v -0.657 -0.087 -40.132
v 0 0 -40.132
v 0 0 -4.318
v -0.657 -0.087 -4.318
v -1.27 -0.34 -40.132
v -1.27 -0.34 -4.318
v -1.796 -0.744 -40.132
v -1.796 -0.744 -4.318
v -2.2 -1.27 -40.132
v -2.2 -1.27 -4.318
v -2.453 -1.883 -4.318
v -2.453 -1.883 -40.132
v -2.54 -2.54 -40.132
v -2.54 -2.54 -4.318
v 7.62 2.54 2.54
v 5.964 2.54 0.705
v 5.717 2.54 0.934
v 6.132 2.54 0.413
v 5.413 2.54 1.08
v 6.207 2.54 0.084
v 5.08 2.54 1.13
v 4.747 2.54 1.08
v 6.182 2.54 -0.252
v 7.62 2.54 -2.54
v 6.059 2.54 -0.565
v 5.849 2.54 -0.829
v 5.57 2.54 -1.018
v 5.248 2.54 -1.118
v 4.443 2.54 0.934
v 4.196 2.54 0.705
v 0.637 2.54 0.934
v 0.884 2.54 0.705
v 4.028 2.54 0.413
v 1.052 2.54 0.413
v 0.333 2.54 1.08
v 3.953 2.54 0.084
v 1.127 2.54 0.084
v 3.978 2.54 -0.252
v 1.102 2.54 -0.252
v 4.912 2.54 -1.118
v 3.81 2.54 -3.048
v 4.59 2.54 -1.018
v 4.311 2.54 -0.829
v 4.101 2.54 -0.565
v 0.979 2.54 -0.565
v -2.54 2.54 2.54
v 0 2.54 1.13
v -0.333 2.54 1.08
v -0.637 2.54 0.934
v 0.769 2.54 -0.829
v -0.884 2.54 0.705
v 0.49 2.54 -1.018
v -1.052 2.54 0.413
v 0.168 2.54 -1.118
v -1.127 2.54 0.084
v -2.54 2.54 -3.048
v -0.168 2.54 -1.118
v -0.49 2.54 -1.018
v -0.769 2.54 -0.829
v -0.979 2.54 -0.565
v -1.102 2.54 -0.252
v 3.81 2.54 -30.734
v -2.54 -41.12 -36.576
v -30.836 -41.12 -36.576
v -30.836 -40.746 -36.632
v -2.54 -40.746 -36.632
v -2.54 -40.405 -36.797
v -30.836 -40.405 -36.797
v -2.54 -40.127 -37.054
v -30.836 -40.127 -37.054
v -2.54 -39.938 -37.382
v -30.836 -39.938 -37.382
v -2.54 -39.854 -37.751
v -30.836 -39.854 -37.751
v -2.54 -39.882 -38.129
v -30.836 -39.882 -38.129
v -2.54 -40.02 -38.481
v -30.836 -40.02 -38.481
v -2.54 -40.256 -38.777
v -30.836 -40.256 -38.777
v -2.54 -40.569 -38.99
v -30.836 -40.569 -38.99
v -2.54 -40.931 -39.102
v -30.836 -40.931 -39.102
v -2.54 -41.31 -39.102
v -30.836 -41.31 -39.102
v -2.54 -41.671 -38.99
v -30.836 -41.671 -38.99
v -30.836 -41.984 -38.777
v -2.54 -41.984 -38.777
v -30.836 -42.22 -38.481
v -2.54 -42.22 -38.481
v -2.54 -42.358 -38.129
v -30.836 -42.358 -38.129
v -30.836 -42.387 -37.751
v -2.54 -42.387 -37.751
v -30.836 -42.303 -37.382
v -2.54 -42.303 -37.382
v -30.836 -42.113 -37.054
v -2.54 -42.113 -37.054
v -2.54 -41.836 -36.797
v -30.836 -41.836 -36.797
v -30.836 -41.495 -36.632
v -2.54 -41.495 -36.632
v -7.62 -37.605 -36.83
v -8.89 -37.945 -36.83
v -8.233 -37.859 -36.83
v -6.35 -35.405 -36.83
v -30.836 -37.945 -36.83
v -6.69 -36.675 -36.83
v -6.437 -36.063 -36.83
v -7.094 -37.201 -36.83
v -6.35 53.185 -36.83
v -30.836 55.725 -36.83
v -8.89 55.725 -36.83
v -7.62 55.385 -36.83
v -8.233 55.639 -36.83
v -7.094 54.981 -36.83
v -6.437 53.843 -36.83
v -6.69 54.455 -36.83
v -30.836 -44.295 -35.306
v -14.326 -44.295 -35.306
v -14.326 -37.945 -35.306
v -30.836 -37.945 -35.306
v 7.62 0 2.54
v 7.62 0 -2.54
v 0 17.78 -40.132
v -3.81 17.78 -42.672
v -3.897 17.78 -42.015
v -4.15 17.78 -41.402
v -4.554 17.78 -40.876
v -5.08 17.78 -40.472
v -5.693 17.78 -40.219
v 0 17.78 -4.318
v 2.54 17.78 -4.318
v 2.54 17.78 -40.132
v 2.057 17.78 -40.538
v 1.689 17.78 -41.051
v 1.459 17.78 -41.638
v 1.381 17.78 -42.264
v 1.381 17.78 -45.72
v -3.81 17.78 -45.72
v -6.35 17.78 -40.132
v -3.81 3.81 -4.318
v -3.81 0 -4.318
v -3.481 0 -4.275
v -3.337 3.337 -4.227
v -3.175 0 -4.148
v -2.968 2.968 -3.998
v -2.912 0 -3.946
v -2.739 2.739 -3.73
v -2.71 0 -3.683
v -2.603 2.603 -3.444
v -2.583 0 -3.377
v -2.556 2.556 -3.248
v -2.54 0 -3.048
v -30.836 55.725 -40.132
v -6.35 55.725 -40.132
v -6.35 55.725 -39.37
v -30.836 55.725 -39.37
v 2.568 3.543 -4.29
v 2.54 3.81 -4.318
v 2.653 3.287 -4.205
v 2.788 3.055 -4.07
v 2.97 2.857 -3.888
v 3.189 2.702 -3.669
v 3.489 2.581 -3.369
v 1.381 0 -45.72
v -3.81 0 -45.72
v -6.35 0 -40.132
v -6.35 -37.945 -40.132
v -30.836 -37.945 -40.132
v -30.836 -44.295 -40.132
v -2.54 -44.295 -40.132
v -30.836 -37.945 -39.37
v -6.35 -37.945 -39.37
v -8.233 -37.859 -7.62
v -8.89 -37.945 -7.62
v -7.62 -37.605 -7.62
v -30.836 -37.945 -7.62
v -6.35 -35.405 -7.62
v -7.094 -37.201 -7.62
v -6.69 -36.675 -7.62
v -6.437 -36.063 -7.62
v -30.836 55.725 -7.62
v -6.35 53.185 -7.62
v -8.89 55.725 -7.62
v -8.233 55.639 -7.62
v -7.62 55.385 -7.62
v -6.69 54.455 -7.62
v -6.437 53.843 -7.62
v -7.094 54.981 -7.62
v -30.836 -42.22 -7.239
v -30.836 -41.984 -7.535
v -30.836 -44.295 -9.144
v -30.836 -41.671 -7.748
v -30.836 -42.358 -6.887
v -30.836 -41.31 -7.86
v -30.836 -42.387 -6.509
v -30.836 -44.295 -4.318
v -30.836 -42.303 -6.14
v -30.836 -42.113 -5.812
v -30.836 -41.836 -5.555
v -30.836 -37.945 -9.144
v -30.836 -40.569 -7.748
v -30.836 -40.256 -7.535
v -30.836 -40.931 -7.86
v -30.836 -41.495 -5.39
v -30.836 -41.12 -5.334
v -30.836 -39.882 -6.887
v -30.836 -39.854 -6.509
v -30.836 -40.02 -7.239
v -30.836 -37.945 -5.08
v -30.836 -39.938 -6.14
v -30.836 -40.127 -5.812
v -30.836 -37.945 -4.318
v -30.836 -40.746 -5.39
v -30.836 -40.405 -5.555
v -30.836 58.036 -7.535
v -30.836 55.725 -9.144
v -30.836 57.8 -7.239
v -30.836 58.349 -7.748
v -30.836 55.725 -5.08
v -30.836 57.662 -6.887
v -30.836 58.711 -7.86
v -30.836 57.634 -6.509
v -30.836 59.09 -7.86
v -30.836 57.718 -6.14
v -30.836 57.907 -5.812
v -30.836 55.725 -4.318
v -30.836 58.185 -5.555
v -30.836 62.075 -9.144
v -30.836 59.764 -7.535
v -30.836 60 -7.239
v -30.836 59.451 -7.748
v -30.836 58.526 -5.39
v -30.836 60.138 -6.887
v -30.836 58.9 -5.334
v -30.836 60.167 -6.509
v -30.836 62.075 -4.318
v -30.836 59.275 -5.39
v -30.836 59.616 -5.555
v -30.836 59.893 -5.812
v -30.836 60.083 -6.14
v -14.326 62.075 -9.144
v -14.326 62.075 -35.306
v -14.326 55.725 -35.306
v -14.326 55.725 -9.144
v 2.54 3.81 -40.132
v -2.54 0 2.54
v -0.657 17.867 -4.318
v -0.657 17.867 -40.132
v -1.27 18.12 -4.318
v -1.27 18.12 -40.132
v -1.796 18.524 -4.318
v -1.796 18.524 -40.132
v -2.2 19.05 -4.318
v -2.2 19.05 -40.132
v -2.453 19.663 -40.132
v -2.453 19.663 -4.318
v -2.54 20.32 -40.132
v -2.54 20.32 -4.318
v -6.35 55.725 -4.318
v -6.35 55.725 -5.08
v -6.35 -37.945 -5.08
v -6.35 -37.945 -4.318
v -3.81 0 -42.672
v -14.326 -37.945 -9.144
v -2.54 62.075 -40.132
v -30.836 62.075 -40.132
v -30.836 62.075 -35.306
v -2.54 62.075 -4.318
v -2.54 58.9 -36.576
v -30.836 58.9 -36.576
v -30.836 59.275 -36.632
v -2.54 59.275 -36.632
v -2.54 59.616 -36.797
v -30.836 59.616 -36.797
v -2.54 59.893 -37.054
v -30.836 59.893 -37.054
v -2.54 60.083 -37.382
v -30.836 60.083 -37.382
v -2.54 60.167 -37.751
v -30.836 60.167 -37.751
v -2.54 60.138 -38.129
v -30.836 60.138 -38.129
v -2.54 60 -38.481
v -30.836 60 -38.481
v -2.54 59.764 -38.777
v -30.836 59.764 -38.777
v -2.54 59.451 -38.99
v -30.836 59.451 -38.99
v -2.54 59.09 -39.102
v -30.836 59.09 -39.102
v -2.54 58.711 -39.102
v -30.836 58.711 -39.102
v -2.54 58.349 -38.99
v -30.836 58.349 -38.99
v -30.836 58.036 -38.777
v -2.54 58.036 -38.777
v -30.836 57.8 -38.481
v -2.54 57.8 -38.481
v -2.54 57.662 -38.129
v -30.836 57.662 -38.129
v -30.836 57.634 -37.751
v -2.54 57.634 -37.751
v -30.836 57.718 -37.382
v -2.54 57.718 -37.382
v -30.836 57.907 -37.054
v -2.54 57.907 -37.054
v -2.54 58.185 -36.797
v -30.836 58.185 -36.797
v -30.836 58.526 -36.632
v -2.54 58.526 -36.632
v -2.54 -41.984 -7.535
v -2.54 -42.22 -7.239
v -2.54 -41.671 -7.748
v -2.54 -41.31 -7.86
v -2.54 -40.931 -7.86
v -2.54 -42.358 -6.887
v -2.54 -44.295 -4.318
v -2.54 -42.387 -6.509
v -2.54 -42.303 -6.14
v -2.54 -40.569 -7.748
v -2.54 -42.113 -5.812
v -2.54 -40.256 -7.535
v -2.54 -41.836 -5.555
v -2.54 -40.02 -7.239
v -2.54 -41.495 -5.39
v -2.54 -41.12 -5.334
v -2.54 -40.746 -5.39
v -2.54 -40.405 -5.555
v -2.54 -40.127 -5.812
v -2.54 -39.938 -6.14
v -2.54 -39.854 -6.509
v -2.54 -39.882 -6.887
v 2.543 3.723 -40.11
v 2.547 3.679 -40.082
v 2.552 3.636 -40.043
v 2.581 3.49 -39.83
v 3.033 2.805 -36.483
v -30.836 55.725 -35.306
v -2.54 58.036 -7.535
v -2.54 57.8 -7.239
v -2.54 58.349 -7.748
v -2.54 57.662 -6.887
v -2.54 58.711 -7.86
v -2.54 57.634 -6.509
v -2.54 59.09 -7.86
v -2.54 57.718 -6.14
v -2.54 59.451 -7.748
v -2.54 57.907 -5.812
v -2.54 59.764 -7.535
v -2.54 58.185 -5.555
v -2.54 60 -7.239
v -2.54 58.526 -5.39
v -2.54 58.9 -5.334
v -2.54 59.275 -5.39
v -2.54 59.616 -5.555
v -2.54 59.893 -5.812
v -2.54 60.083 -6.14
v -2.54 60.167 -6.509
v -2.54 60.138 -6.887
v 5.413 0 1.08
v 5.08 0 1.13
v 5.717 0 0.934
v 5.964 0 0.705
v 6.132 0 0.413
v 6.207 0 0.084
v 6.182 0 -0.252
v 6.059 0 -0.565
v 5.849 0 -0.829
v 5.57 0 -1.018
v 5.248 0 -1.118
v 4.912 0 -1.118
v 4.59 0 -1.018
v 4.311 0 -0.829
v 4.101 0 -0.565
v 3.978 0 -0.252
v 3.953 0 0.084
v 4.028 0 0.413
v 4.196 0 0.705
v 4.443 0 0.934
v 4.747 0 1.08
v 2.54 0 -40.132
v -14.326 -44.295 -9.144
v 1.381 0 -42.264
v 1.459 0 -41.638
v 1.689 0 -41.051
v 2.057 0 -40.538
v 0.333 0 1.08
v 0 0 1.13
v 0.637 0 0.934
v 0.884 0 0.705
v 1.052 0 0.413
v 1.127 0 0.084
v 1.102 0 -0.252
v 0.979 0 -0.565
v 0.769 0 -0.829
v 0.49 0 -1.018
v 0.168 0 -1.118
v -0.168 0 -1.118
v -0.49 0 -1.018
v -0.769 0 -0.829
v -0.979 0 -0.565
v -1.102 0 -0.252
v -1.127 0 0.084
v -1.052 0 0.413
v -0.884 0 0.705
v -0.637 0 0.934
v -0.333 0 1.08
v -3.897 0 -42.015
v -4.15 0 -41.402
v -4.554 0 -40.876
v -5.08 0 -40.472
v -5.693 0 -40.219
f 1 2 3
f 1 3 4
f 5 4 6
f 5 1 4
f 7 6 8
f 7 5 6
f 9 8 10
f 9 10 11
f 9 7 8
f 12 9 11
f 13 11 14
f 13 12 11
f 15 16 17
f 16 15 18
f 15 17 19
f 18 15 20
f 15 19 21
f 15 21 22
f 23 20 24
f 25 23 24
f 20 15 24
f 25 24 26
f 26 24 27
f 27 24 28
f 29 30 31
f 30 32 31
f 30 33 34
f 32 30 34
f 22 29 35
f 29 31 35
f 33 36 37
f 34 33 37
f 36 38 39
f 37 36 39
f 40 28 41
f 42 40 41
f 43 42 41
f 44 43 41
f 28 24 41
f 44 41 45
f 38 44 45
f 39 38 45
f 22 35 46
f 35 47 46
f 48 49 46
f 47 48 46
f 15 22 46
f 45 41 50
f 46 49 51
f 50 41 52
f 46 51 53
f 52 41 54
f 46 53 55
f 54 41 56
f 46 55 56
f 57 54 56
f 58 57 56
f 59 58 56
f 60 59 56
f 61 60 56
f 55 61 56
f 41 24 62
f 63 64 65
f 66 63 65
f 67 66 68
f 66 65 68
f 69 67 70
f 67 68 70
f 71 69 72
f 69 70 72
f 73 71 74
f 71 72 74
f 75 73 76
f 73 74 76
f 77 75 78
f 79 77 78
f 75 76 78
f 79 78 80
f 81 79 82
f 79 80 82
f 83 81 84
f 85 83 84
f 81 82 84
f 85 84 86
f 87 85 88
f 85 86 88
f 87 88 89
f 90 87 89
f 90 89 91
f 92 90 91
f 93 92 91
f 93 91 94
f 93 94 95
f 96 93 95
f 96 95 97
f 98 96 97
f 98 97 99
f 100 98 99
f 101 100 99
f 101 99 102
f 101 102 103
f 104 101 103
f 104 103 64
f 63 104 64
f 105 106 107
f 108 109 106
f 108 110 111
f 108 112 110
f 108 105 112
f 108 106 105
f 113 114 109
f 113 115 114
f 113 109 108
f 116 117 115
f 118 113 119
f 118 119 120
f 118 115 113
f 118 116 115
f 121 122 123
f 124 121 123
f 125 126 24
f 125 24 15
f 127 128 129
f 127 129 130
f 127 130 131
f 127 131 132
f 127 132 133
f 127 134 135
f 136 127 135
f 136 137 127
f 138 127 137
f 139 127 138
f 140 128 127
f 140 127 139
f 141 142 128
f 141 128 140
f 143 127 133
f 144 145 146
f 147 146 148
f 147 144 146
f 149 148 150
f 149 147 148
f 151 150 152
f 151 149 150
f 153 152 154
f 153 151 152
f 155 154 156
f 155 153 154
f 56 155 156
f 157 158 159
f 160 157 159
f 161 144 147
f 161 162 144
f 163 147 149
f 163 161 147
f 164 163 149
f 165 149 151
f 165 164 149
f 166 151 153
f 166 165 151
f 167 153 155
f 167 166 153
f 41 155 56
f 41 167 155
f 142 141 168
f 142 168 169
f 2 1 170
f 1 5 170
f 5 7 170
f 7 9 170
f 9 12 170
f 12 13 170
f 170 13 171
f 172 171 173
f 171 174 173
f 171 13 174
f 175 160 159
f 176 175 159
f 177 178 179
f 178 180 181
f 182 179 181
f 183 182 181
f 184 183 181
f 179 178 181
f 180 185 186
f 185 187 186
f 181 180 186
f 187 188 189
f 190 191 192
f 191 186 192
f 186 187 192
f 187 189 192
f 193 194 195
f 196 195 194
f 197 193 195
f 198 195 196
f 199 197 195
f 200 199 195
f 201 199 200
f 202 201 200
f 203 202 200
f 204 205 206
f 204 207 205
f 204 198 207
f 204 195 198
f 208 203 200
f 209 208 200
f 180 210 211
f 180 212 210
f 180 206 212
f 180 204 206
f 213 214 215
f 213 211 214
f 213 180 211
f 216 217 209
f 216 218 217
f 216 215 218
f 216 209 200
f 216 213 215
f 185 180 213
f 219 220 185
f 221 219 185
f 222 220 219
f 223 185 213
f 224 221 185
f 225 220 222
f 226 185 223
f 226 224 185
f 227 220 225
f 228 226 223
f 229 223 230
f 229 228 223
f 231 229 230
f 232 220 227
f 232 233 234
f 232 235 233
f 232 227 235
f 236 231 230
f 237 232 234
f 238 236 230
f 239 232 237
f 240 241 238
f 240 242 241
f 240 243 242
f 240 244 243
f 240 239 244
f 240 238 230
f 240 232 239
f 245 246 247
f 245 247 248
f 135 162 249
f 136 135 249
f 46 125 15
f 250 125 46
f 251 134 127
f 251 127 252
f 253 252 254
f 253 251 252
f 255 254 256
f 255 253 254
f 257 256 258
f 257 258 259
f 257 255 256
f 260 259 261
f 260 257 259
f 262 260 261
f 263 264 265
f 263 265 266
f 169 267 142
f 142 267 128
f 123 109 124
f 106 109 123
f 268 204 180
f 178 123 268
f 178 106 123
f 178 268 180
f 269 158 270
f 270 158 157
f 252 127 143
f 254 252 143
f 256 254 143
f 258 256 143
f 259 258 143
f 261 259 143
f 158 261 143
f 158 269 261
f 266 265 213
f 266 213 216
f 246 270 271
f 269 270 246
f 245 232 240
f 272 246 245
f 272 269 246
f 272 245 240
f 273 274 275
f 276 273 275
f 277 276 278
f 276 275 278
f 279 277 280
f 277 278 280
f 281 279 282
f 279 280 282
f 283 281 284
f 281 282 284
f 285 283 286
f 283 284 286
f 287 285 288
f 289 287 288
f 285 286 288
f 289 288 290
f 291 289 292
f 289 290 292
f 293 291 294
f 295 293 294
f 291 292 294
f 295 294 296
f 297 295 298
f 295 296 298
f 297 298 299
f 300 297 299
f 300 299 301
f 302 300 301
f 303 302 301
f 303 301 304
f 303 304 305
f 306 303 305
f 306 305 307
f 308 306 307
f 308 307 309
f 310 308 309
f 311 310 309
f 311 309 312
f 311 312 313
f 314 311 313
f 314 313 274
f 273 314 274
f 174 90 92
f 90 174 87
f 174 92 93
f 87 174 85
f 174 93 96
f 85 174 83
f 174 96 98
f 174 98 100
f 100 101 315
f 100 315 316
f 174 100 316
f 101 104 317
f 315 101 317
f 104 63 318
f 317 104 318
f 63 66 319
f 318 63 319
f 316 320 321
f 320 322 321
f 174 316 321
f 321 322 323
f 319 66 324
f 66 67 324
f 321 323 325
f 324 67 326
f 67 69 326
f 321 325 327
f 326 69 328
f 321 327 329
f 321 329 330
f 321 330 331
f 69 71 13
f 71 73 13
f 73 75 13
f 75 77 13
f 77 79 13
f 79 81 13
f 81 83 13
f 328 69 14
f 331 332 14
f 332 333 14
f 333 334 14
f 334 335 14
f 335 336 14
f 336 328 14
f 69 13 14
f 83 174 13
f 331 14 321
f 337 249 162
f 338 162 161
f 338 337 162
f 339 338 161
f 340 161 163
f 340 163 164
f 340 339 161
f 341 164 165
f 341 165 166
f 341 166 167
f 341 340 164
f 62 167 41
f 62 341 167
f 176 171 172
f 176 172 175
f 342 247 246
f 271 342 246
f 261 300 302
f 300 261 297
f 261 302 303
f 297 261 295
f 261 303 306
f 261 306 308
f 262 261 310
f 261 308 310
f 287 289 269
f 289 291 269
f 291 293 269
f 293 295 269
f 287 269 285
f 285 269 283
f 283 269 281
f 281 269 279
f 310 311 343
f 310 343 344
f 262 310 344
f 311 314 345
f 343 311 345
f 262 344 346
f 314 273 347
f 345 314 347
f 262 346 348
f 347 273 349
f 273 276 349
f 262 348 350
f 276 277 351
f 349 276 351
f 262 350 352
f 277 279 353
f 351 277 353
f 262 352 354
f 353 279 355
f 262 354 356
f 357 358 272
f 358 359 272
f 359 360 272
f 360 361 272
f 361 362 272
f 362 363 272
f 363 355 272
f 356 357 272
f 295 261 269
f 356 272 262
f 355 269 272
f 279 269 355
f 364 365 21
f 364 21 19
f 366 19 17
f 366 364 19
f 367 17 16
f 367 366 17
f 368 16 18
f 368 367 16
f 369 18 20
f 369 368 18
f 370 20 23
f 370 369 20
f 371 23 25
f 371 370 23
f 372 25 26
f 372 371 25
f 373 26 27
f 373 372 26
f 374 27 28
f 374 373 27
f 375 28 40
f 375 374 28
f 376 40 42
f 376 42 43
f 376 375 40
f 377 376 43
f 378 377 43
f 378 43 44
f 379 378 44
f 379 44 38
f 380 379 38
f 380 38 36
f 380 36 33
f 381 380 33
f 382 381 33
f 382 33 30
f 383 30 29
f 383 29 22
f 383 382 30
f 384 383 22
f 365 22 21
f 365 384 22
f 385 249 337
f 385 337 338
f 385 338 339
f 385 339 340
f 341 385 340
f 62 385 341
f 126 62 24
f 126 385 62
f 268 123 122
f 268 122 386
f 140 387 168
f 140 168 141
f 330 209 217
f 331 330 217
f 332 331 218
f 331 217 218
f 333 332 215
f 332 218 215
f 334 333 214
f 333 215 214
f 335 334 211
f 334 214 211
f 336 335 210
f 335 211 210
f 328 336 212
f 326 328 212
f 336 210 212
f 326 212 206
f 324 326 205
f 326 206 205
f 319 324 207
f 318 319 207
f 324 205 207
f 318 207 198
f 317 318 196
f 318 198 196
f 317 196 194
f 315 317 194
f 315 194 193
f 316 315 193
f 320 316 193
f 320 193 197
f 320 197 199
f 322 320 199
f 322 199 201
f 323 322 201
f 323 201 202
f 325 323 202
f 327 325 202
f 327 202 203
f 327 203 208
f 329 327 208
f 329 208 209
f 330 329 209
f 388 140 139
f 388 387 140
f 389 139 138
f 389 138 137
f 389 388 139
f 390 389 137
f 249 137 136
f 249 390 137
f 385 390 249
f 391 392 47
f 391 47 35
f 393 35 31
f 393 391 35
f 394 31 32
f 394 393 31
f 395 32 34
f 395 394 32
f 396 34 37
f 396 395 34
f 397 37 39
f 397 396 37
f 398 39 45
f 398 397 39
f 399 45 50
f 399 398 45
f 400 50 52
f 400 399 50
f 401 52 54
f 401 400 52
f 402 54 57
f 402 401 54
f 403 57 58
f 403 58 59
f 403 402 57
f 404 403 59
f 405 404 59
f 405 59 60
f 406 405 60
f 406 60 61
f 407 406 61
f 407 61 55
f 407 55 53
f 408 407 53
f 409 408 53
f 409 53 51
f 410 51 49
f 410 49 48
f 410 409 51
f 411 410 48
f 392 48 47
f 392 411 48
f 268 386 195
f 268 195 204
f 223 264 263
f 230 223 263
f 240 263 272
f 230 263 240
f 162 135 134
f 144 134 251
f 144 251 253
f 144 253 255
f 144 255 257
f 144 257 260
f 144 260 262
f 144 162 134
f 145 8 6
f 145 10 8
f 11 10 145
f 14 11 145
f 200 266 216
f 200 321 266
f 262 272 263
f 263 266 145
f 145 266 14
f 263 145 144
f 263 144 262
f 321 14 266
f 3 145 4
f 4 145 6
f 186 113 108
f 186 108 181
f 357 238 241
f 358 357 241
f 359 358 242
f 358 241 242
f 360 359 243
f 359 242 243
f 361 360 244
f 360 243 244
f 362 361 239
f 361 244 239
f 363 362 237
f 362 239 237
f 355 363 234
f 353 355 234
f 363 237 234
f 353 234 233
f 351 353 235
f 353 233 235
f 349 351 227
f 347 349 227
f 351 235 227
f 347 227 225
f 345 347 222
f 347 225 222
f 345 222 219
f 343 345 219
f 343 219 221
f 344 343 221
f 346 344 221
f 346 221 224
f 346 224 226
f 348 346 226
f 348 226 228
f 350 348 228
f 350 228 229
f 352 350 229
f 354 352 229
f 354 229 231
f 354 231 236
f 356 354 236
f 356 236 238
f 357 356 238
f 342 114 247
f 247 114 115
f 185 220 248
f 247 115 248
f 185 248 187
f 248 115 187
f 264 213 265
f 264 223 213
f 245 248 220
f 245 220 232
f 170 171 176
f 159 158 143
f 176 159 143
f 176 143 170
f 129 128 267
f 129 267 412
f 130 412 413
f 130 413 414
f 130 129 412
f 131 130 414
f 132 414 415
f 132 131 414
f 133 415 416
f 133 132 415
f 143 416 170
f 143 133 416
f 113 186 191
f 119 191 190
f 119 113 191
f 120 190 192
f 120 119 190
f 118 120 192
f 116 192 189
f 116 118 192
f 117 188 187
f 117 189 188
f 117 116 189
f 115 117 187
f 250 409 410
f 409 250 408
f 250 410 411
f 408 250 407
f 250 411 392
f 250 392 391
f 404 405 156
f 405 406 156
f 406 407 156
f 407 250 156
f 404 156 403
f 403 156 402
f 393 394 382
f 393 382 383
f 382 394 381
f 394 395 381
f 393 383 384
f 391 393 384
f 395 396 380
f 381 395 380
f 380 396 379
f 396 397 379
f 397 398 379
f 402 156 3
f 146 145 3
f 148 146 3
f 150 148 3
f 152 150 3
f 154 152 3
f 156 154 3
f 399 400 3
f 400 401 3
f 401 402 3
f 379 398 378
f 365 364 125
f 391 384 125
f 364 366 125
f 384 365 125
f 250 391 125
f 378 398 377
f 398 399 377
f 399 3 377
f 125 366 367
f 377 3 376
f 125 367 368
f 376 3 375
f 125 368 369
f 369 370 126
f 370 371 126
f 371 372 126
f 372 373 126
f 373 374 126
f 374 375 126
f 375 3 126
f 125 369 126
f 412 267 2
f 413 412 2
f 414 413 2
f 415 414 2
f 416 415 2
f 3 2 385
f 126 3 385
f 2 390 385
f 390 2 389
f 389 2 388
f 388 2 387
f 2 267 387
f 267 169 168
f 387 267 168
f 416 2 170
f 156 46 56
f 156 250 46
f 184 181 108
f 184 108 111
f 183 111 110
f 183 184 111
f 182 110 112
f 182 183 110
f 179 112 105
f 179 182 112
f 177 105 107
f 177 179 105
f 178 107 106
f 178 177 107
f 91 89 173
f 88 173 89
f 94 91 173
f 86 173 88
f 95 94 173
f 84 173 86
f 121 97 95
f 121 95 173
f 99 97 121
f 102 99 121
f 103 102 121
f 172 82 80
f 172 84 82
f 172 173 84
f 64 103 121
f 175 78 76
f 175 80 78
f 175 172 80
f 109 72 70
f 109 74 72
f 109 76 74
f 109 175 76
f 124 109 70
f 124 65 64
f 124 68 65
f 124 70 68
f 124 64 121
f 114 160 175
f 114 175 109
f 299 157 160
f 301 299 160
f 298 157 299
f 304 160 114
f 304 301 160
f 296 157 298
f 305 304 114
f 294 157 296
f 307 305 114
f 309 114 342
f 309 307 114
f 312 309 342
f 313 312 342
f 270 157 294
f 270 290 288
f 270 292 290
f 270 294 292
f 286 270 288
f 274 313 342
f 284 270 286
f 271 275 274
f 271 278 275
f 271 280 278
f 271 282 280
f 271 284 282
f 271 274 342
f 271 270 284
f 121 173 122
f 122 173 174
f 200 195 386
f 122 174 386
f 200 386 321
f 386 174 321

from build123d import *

# Parameters (mm, degrees)
SKETCH1_R           = 1.1303
BOSS_EXTRUDE1_DEPTH = 2.54
SKETCH2_W           = 5.08
SKETCH2_H           = 35.814
BOSS_EXTRUDE2_DEPTH = 15.24
SKETCH3_W           = 35.814
SKETCH3_H           = 106.370628
BOSS_EXTRUDE3_DEPTH = 3.81
FILLET1_R           = 1.27
SKETCH4_W           = 5.191
SKETCH4_H           = 17.78
BOSS_EXTRUDE4_DEPTH = 5.588
SKETCH5_W           = 35.814
SKETCH5_H           = 6.35
BOSS_EXTRUDE5_DEPTH = 7.9756
SKETCH6_W           = 4.826
SKETCH6_H           = 6.35
BOSS_EXTRUDE6_DEPTH = 16.51
BOSS_EXTRUDE8_START = -0.762
SKETCH7_W           = 24.4856
SKETCH7_H           = 93.670628
BOSS_EXTRUDE8_DEPTH = 2.54
FILLET2_R           = 2.54
SKETCH8_R           = 1.27
CUT_EXTRUDE1_DEPTH  = 87.153909833


with BuildPart() as part:
    # Sketch1 → Boss-Extrude1 (new body)
    with BuildSketch(Plane(origin=(0, 0, 0), x_dir=(1, 0, 0), z_dir=(0, 1, 0))):
        Polygon((-2.54, 2.54), (-2.54, 40.132), (2.54, 40.132), (7.62, 2.54), (7.62, -2.54), (-2.54, -2.54), align=None)
        with Locations(Location((0, 0, 0), (0, 0, 270))):
            Circle(SKETCH1_R, mode=Mode.SUBTRACT)
        with Locations(Location((5.08, 0, 0), (0, 0, 270))):
            Circle(SKETCH1_R, mode=Mode.SUBTRACT)
    extrude(amount=BOSS_EXTRUDE1_DEPTH)

    # Sketch2 → Boss-Extrude2 (add)
    with BuildSketch(Plane(origin=(0, 2.54, 0), x_dir=(1, 0, 0), z_dir=(0, 1, 0))):
        with Locations((0, 22.225)):
            Rectangle(SKETCH2_W, SKETCH2_H)
    extrude(amount=BOSS_EXTRUDE2_DEPTH)

    # Sketch3 → Boss-Extrude3 (add)
    with BuildSketch(Plane.ZY.offset(2.54)):
        with Locations((-22.225, 8.89)):
            Rectangle(SKETCH3_W, SKETCH3_H)
    extrude(amount=BOSS_EXTRUDE3_DEPTH)

    # Fillet1
    fillet1_edges = [part.edges().sort_by_distance(p)[0] for p in [
        (0, 2.54, -4.318),
        (2.54, 2.54, -22.225),
        (-2.54, 1.27, -4.318),
    ]]
    fillet(fillet1_edges, radius=FILLET1_R)

    # Sketch4 → Boss-Extrude4 (add)
    with BuildSketch(Plane(origin=(0, 0, -40.132), x_dir=(-1, 0, 0), z_dir=(0, 0, -1))):
        with Locations((1.2145, 8.89)):
            Rectangle(SKETCH4_W, SKETCH4_H)
    extrude(amount=BOSS_EXTRUDE4_DEPTH)

    # Sketch5 → Boss-Extrude5 (add)
    with BuildSketch(Plane.ZY.offset(6.35)):
        with Locations((-22.225, -41.120314)):
            Rectangle(SKETCH5_W, SKETCH5_H)
        with Locations((-22.225, 58.900314)):
            Rectangle(SKETCH5_W, SKETCH5_H)
    extrude(amount=BOSS_EXTRUDE5_DEPTH)

    # Sketch6 → Boss-Extrude6 (add)
    with BuildSketch(Plane.ZY.offset(14.3256)):
        with Locations((-37.719, 58.900314)):
            Rectangle(SKETCH6_W, SKETCH6_H)
        with Locations((-6.731, 58.900314)):
            Rectangle(SKETCH6_W, SKETCH6_H)
        with Locations((-37.719, -41.120314)):
            Rectangle(SKETCH6_W, SKETCH6_H)
        with Locations((-6.731, -41.120314)):
            Rectangle(SKETCH6_W, SKETCH6_H)
    extrude(amount=BOSS_EXTRUDE6_DEPTH)

    # Sketch7 → Boss-Extrude8 (add)
    with BuildSketch(Plane.XY.offset(-4.318).offset(BOSS_EXTRUDE8_START)):
        with Locations((-18.5928, 8.89)):
            Rectangle(SKETCH7_W, SKETCH7_H)
    boss_extrude8 = extrude(amount=-BOSS_EXTRUDE8_DEPTH)

    # Mirror2: Boss-Extrude8 across plane
    add(boss_extrude8.mirror(Plane.XY.offset(-22.225)))

    # Fillet2
    # the kernel refuses this fillet: 2.54 mm, written as the material it adds along each edge
    with BuildSketch(Plane(origin=(-6.35, -37.945314, -1.27), x_dir=(-1, 0, 0), z_dir=(0, 0, -1))) as fillet2_piece_1_section:
        with BuildLine():
            CenterArc((FILLET2_R, FILLET2_R), FILLET2_R, 180, 90)
            Line((0, FILLET2_R), (0, 0))
            Line((0, 0), (FILLET2_R, 0))
        make_face()
    fillet2_piece_1 = extrude(amount=35.56, mode=Mode.PRIVATE)
    fillet2_piece_1 = split(fillet2_piece_1, bisect_by=Plane(origin=(-6.917354565, -37.377959435, -5.08), z_dir=(0, 0, -1)), keep=Keep.TOP, mode=Mode.PRIVATE)
    add(fillet2_piece_1)
    with BuildSketch(Plane(origin=(-6.35, 55.725314, -36.83), x_dir=(-1, 0, 0), z_dir=(0, 0, 1))) as fillet2_piece_2_section:
        with BuildLine():
            CenterArc((FILLET2_R, FILLET2_R), FILLET2_R, 180, 90)
            Line((0, FILLET2_R), (0, 0))
            Line((0, 0), (FILLET2_R, 0))
        make_face()
    fillet2_piece_2 = extrude(amount=35.56, mode=Mode.PRIVATE)
    fillet2_piece_2 = split(fillet2_piece_2, bisect_by=Plane(origin=(-6.917354565, 55.157959435, -5.08), z_dir=(0, 0, -1)), keep=Keep.TOP, mode=Mode.PRIVATE)
    add(fillet2_piece_2)
    with BuildSketch(Plane(origin=(-2.54, 17.78, -4.318), x_dir=(1, 0, 0), z_dir=(0, 0, -1)), Plane(origin=(-2.54, 0, -40.132), x_dir=(1, 0, 0), z_dir=(0, 0, 1))) as fillet2_piece_3:
        with BuildLine():
            CenterArc((FILLET2_R, -FILLET2_R), FILLET2_R, 90, 90)
            Line((0, -FILLET2_R), (0, 0))
            Line((0, 0), (FILLET2_R, 0))
        make_face()
    extrude(amount=35.814)
    with BuildSketch(Plane(origin=(1.381, 0, -40.132), x_dir=(0, 0, -1), z_dir=(0, 1, 0))) as fillet2_piece_4:
        with BuildLine():
            CenterArc((2.131768984, -2.54), FILLET2_R, 90, 57.064075369)
            Line((0, -1.159), (0, 0))
            Line((0, 0), (2.131768984, 0))
        make_face()
    extrude(amount=3.810000082)
    with BuildSketch(Plane(origin=(1.381, 3.810000082, -40.132), x_dir=(0, 0, -1), z_dir=(0, 1, 0))) as fillet2_piece_5:
        with BuildLine():
            CenterArc((2.131768984, -2.54), FILLET2_R, 90, 57.064075369)
            Line((0, -1.159), (0, 0))
            Line((0, 0), (2.131768984, 0))
        make_face()
    extrude(amount=13.969999918)
    with BuildSketch(Plane(origin=(-3.81, 17.78, -40.132), x_dir=(-1, 0, 0), z_dir=(0, -1, 0))) as fillet2_piece_6:
        with BuildLine():
            CenterArc((FILLET2_R, FILLET2_R), FILLET2_R, 180, 90)
            Line((0, FILLET2_R), (0, 0))
            Line((0, 0), (FILLET2_R, 0))
        make_face()
    extrude(amount=17.78)

    # Sketch8 → Cut-Extrude1 (cut, through all)
    with BuildSketch(Plane.ZY.offset(30.8356)):
        with Locations((-37.846, 58.900314)):
            Circle(SKETCH8_R)
        with Locations((-6.604, 58.900314)):
            Circle(SKETCH8_R)
        with Locations((-37.846, -41.120314)):
            Circle(SKETCH8_R)
        with Locations((-6.604, -41.120314)):
            Circle(SKETCH8_R)
    extrude(amount=-CUT_EXTRUDE1_DEPTH, mode=Mode.SUBTRACT)


solid = part.part
